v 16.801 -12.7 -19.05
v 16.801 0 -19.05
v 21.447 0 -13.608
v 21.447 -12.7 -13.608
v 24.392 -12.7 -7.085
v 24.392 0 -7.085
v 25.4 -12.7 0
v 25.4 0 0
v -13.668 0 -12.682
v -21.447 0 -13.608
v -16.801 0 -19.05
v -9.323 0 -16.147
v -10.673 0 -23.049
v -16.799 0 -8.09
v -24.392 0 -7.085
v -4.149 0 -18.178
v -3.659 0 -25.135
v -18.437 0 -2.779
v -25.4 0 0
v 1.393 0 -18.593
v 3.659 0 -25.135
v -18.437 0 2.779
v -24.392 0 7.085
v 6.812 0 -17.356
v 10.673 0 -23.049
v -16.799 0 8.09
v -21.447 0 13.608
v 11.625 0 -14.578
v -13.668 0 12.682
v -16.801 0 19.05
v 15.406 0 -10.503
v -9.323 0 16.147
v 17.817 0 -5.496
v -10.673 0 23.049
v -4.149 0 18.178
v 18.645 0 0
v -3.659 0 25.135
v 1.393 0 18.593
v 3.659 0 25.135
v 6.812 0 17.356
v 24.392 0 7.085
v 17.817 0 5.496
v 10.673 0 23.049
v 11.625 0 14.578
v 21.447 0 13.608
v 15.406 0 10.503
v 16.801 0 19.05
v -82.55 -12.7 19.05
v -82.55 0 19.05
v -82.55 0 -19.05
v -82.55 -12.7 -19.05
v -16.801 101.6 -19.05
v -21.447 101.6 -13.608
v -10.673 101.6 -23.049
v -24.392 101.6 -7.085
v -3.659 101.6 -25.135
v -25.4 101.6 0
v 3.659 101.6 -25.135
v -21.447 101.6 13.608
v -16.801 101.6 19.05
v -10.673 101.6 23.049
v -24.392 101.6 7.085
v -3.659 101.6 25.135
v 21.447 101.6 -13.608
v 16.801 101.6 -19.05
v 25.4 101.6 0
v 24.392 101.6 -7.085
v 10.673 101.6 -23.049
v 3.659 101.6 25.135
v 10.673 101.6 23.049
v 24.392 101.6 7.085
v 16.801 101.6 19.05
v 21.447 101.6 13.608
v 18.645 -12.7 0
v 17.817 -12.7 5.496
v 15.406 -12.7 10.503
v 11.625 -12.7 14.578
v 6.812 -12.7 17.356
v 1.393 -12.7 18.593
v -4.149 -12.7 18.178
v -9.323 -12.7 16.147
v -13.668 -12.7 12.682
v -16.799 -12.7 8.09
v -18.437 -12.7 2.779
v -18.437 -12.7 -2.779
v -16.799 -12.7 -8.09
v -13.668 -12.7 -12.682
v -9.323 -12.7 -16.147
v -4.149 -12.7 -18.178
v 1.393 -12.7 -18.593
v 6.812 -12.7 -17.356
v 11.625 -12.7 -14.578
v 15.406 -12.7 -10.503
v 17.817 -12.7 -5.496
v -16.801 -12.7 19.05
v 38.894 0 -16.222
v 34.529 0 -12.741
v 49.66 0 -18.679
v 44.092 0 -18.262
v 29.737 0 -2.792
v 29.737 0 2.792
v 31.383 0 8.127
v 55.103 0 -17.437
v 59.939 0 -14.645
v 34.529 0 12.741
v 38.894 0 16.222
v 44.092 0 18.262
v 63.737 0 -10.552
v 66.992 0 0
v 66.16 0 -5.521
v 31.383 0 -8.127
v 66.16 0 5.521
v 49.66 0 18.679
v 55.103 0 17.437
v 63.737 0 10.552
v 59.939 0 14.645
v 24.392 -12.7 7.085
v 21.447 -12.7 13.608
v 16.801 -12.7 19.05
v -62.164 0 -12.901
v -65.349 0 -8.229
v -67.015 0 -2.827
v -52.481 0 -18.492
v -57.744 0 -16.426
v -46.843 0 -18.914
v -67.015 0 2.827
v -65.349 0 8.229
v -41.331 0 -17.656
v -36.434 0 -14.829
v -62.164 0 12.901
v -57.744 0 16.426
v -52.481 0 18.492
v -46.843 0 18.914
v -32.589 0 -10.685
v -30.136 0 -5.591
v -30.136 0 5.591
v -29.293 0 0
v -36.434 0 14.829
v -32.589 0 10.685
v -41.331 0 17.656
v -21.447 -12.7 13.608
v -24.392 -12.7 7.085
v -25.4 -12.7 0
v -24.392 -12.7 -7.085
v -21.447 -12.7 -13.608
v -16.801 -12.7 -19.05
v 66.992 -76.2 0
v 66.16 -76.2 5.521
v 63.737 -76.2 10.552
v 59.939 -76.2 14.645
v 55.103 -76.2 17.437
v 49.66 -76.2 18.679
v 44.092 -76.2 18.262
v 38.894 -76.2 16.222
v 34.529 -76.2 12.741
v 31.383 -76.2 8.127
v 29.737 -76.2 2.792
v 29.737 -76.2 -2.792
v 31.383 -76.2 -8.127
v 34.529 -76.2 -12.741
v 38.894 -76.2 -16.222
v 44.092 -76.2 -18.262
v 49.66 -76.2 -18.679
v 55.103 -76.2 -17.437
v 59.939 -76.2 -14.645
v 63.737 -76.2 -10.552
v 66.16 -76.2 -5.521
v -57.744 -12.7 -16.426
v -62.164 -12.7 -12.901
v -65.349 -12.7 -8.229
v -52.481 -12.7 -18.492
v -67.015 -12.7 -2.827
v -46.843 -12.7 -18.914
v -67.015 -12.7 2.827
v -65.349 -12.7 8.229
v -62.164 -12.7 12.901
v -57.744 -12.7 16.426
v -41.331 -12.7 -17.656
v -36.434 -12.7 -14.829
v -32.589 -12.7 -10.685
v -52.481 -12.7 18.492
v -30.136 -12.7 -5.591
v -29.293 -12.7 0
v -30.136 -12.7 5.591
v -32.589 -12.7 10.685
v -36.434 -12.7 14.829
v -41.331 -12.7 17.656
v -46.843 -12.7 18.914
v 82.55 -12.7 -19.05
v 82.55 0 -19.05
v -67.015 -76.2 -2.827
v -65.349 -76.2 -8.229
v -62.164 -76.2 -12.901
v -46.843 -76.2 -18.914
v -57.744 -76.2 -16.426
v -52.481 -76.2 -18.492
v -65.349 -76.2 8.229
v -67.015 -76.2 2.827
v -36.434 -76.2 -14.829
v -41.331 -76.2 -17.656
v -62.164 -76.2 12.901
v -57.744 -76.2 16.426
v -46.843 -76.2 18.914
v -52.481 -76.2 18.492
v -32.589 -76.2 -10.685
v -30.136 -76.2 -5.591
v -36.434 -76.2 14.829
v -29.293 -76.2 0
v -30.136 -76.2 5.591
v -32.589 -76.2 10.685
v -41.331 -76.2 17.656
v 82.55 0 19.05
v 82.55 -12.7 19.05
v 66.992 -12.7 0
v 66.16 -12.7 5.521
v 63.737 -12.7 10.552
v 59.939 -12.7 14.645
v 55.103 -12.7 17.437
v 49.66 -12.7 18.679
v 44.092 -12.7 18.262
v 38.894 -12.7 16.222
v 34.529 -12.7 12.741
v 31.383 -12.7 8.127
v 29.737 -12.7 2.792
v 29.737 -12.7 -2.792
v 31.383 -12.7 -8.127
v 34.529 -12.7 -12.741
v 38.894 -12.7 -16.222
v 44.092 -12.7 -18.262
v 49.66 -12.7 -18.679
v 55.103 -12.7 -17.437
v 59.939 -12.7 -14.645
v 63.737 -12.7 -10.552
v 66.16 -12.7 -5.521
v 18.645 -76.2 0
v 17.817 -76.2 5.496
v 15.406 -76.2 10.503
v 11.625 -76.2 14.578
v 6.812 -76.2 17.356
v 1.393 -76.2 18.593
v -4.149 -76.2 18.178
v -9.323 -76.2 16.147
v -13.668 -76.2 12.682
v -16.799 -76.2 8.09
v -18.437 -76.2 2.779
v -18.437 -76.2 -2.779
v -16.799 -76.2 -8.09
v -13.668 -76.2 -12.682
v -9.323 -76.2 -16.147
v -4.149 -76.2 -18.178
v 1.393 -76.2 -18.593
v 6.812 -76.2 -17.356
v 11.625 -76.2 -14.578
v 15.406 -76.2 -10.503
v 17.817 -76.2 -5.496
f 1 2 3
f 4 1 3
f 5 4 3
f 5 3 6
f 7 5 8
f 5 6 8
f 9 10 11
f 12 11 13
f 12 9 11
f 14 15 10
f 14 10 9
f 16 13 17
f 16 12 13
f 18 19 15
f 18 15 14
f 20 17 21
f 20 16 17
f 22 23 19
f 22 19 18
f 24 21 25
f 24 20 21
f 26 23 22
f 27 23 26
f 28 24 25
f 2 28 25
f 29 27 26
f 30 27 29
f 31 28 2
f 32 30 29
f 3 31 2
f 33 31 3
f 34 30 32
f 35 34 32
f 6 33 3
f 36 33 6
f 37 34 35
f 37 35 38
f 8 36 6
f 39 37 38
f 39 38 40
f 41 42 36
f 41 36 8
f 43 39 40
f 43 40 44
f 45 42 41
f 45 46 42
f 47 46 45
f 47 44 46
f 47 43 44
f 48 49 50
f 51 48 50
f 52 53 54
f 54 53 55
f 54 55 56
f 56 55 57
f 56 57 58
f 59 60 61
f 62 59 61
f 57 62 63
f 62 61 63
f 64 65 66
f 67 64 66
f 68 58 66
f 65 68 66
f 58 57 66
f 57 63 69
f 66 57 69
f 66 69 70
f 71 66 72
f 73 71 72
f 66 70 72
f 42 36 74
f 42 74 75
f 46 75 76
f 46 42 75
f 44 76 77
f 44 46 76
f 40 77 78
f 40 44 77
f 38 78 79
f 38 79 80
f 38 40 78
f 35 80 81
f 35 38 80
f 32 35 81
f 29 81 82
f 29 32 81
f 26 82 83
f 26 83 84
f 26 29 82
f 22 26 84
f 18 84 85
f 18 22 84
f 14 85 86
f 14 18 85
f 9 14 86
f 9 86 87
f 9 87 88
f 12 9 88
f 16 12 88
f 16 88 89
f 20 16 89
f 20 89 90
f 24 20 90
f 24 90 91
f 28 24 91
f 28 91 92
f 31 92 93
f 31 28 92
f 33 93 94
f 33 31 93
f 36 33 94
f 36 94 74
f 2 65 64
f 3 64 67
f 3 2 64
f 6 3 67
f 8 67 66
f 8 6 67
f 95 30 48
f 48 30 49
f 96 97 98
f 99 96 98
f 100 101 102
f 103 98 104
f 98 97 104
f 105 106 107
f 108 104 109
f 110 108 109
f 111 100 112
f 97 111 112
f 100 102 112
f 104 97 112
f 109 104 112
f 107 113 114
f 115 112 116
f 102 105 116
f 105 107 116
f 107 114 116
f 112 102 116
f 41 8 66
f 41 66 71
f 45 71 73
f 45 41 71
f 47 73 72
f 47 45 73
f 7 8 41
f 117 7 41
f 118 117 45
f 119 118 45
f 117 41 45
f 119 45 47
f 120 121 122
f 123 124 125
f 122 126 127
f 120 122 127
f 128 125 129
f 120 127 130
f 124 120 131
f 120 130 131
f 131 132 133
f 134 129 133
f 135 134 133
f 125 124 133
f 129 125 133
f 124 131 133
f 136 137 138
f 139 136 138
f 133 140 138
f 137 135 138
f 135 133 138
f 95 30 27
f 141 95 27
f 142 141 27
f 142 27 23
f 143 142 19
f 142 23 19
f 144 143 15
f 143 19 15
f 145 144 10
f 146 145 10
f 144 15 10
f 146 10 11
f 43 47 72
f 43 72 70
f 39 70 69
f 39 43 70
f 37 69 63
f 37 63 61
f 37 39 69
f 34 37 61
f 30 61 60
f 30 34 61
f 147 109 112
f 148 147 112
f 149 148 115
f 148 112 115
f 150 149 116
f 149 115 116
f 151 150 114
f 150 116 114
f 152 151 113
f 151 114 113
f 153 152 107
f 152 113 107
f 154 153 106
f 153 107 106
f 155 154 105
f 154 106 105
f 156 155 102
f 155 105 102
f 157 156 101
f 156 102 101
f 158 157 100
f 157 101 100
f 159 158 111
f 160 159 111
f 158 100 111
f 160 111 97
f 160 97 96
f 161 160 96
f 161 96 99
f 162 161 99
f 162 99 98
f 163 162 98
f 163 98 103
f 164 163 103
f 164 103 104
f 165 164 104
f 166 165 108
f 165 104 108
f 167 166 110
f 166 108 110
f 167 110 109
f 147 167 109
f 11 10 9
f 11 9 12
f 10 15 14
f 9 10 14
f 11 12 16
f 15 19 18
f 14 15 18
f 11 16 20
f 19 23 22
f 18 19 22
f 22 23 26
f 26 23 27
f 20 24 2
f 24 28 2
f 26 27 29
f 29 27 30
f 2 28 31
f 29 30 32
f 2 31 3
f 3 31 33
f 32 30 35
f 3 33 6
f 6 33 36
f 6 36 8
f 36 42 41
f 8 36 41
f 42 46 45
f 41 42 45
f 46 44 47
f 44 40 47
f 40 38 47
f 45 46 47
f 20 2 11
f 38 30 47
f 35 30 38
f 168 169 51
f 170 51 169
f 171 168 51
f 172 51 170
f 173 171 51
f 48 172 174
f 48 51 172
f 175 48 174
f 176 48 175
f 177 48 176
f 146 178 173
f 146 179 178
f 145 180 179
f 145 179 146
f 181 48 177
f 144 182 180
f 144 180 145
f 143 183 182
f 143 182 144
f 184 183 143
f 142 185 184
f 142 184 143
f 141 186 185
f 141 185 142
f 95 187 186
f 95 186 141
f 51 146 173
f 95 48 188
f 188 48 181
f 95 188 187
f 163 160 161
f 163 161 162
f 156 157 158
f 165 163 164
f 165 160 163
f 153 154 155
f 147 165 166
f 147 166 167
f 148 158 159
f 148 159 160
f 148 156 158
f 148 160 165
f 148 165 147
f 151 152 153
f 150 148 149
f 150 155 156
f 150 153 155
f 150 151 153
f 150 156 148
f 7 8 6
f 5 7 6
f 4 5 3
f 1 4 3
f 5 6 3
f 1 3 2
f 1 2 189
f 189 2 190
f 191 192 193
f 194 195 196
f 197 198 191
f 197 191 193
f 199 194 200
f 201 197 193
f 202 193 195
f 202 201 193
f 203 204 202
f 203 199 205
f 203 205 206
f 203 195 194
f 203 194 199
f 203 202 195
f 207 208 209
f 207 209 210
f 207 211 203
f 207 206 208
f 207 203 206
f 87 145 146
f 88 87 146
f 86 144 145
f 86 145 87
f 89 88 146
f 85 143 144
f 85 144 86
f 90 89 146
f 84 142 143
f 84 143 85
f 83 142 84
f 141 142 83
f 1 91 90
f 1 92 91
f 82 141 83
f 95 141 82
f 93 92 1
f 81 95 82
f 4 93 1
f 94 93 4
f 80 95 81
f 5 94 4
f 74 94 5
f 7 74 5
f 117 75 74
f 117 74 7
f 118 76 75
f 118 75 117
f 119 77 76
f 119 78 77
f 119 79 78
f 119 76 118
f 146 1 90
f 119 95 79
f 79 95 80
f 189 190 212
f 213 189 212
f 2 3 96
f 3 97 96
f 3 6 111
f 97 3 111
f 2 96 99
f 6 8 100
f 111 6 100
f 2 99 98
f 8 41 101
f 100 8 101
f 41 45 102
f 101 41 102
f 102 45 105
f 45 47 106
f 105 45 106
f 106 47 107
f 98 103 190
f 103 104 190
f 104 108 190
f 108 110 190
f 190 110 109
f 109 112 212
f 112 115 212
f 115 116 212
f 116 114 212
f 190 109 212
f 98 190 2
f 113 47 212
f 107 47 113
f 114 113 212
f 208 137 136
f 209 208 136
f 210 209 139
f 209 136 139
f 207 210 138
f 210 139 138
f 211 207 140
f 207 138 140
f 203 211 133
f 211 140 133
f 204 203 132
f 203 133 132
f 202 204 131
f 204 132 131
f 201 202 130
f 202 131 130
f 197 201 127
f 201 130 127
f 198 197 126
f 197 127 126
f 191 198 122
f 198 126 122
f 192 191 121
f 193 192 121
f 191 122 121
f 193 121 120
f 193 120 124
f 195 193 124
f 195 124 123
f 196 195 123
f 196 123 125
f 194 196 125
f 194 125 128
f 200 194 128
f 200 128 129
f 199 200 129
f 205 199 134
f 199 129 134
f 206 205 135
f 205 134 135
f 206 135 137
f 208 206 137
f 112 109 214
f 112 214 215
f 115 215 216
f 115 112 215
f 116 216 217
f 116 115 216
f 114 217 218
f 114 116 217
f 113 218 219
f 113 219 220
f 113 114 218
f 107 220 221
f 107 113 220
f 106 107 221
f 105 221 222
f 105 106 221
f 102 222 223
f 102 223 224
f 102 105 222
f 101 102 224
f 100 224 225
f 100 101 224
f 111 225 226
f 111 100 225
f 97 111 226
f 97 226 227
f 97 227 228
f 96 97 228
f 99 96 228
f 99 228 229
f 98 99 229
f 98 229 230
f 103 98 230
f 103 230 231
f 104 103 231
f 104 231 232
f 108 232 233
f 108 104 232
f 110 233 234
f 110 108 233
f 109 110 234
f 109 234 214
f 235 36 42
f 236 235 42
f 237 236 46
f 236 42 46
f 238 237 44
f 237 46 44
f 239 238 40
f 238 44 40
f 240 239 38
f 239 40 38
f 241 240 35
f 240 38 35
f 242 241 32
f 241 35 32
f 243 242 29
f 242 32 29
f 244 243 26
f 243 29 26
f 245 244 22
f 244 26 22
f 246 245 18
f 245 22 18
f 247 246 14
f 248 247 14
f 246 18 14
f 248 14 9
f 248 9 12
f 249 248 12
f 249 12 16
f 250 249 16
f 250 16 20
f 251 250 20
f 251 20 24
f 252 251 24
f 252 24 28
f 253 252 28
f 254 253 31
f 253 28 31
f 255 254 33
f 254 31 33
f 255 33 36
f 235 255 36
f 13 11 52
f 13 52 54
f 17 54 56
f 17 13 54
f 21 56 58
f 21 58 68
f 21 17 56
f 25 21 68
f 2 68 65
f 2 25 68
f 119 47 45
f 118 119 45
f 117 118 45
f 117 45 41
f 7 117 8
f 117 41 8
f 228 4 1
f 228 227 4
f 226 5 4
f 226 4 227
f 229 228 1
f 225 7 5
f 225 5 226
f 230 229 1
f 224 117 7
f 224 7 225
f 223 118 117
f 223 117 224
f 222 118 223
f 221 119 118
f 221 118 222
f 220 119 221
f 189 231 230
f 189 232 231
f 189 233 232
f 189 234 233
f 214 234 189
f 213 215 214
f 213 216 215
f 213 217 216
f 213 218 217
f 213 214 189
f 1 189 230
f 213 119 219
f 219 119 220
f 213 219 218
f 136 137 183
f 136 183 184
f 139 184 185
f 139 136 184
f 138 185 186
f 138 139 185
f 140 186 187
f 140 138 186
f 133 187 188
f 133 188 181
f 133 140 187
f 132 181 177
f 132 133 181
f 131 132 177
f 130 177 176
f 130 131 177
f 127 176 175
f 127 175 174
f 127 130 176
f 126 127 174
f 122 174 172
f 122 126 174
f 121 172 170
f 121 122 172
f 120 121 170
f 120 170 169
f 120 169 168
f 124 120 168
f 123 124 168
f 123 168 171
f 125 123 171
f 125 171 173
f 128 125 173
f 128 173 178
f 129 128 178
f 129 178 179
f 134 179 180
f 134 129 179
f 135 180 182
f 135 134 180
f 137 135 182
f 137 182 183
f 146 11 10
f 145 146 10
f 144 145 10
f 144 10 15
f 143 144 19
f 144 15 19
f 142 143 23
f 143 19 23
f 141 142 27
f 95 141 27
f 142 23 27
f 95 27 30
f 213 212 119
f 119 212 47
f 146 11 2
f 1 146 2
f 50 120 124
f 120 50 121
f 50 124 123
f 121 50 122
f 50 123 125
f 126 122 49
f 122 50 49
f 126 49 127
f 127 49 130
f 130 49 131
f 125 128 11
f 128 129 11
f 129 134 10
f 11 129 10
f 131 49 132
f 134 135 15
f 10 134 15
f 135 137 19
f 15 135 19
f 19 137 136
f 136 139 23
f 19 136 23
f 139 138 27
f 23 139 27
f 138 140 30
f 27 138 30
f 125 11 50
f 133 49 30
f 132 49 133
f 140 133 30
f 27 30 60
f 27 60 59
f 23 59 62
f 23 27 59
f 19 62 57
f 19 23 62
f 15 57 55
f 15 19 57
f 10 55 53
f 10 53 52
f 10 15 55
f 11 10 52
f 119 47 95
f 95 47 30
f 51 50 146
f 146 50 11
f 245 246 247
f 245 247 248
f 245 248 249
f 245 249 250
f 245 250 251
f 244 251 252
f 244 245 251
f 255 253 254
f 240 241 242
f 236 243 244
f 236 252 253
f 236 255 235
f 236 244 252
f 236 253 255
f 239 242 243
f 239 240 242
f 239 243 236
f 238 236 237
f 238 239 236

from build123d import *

# Parameters (mm, degrees)
F0_R     = 18.6453742802
F1_DEPTH = 76.2
F0_R_2   = 18.967057506
F0_R_3   = 18.7317568453
F2_DEPTH = 12.7
F3_DEPTH = 101.6
F4_DEPTH = 12.7


with BuildPart() as f1:
    # F0 (on Front) → F1 (new body)
    with BuildSketch(Plane.XZ):
        Circle(F0_R)
    extrude(amount=F1_DEPTH)



with BuildPart() as f1b:
    # F0 (on Front) → F1, piece 2 (new body)
    with BuildSketch(Plane.XZ):
        with Locations((-48.26, 0)):
            Circle(F0_R_2)
    extrude(amount=F1_DEPTH)


with BuildPart() as f1c:
    # F0 (on Front) → F1, piece 3 (new body)
    with BuildSketch(Plane.XZ):
        with Locations((48.26, 0)):
            Circle(F0_R_3)
    extrude(amount=F1_DEPTH)


with BuildPart() as f2:
    # F0 (on Front) → F2 (new body)
    with BuildSketch(Plane.XZ):
        with BuildLine():
            Line((16.8005208253, -19.05), (82.55, -19.05))
            Line((82.55, -19.05), (82.55, 19.05))
            Line((82.55, 19.05), (16.8005208253, 19.05))
            ThreePointArc((16.8005208253, 19.05), (23.1505208253, 10.4505208253), (25.4, 0))
            ThreePointArc((25.4, 0), (23.1505208253, -10.4505208253), (16.8005208253, -19.05))
        make_face()
        with Locations((48.26, 0)):
            Circle(F0_R_3, mode=Mode.SUBTRACT)
    extrude(amount=F2_DEPTH)


with BuildPart() as f2b:
    # F0 (on Front) → F2, piece 2 (new body)
    with BuildSketch(Plane.XZ):
        with BuildLine():
            Line((-82.55, -19.05), (-16.8005208253, -19.05))
            ThreePointArc((-16.8005208253, -19.05), (-25.4, 0), (-16.8005208253, 19.05))
            Line((-16.8005208253, 19.05), (-82.55, 19.05))
            Line((-82.55, 19.05), (-82.55, -19.05))
        make_face()
        with Locations((-48.26, 0)):
            Circle(F0_R_2, mode=Mode.SUBTRACT)
    extrude(amount=F2_DEPTH)


with BuildPart() as f1_1:
    add(f1.part)

    add(f2.part)  # F3 merges F2

    add(f2b.part)  # F3 merges F2b
    # F0 (on Front) → F3 (join)
    with BuildSketch(Plane.XZ):
        with BuildLine():
            Line((-16.8005208253, -19.05), (16.8005208253, -19.05))
            ThreePointArc((16.8005208253, -19.05), (23.1505208253, -10.4505208253), (25.4, 0))
            ThreePointArc((25.4, 0), (23.1505208253, 10.4505208253), (16.8005208253, 19.05))
            Line((16.8005208253, 19.05), (-16.8005208253, 19.05))
            ThreePointArc((-16.8005208253, 19.05), (-25.4, 0), (-16.8005208253, -19.05))
        make_face()
        Circle(F0_R, mode=Mode.SUBTRACT)
        Circle(F0_R)
        with BuildLine():
            ThreePointArc((-16.8005208253, -19.05), (0, -25.4), (16.8005208253, -19.05))
            Line((16.8005208253, -19.05), (-16.8005208253, -19.05))
        make_face()
        with BuildLine():
            Line((-16.8005208253, 19.05), (16.8005208253, 19.05))
            ThreePointArc((16.8005208253, 19.05), (0, 25.4), (-16.8005208253, 19.05))
        make_face()
    extrude(amount=-F3_DEPTH)


with BuildPart() as f4:
    # F0 (on Front) → F4 (new body)
    with BuildSketch(Plane.XZ):
        with BuildLine():
            Line((-16.8005208253, -19.05), (16.8005208253, -19.05))
            ThreePointArc((16.8005208253, -19.05), (23.1505208253, -10.4505208253), (25.4, 0))
            ThreePointArc((25.4, 0), (23.1505208253, 10.4505208253), (16.8005208253, 19.05))
            Line((16.8005208253, 19.05), (-16.8005208253, 19.05))
            ThreePointArc((-16.8005208253, 19.05), (-25.4, 0), (-16.8005208253, -19.05))
        make_face()
        Circle(F0_R, mode=Mode.SUBTRACT)
    extrude(amount=F4_DEPTH)


solid = Compound([f1b.part, f1c.part, f1_1.part, f4.part])
